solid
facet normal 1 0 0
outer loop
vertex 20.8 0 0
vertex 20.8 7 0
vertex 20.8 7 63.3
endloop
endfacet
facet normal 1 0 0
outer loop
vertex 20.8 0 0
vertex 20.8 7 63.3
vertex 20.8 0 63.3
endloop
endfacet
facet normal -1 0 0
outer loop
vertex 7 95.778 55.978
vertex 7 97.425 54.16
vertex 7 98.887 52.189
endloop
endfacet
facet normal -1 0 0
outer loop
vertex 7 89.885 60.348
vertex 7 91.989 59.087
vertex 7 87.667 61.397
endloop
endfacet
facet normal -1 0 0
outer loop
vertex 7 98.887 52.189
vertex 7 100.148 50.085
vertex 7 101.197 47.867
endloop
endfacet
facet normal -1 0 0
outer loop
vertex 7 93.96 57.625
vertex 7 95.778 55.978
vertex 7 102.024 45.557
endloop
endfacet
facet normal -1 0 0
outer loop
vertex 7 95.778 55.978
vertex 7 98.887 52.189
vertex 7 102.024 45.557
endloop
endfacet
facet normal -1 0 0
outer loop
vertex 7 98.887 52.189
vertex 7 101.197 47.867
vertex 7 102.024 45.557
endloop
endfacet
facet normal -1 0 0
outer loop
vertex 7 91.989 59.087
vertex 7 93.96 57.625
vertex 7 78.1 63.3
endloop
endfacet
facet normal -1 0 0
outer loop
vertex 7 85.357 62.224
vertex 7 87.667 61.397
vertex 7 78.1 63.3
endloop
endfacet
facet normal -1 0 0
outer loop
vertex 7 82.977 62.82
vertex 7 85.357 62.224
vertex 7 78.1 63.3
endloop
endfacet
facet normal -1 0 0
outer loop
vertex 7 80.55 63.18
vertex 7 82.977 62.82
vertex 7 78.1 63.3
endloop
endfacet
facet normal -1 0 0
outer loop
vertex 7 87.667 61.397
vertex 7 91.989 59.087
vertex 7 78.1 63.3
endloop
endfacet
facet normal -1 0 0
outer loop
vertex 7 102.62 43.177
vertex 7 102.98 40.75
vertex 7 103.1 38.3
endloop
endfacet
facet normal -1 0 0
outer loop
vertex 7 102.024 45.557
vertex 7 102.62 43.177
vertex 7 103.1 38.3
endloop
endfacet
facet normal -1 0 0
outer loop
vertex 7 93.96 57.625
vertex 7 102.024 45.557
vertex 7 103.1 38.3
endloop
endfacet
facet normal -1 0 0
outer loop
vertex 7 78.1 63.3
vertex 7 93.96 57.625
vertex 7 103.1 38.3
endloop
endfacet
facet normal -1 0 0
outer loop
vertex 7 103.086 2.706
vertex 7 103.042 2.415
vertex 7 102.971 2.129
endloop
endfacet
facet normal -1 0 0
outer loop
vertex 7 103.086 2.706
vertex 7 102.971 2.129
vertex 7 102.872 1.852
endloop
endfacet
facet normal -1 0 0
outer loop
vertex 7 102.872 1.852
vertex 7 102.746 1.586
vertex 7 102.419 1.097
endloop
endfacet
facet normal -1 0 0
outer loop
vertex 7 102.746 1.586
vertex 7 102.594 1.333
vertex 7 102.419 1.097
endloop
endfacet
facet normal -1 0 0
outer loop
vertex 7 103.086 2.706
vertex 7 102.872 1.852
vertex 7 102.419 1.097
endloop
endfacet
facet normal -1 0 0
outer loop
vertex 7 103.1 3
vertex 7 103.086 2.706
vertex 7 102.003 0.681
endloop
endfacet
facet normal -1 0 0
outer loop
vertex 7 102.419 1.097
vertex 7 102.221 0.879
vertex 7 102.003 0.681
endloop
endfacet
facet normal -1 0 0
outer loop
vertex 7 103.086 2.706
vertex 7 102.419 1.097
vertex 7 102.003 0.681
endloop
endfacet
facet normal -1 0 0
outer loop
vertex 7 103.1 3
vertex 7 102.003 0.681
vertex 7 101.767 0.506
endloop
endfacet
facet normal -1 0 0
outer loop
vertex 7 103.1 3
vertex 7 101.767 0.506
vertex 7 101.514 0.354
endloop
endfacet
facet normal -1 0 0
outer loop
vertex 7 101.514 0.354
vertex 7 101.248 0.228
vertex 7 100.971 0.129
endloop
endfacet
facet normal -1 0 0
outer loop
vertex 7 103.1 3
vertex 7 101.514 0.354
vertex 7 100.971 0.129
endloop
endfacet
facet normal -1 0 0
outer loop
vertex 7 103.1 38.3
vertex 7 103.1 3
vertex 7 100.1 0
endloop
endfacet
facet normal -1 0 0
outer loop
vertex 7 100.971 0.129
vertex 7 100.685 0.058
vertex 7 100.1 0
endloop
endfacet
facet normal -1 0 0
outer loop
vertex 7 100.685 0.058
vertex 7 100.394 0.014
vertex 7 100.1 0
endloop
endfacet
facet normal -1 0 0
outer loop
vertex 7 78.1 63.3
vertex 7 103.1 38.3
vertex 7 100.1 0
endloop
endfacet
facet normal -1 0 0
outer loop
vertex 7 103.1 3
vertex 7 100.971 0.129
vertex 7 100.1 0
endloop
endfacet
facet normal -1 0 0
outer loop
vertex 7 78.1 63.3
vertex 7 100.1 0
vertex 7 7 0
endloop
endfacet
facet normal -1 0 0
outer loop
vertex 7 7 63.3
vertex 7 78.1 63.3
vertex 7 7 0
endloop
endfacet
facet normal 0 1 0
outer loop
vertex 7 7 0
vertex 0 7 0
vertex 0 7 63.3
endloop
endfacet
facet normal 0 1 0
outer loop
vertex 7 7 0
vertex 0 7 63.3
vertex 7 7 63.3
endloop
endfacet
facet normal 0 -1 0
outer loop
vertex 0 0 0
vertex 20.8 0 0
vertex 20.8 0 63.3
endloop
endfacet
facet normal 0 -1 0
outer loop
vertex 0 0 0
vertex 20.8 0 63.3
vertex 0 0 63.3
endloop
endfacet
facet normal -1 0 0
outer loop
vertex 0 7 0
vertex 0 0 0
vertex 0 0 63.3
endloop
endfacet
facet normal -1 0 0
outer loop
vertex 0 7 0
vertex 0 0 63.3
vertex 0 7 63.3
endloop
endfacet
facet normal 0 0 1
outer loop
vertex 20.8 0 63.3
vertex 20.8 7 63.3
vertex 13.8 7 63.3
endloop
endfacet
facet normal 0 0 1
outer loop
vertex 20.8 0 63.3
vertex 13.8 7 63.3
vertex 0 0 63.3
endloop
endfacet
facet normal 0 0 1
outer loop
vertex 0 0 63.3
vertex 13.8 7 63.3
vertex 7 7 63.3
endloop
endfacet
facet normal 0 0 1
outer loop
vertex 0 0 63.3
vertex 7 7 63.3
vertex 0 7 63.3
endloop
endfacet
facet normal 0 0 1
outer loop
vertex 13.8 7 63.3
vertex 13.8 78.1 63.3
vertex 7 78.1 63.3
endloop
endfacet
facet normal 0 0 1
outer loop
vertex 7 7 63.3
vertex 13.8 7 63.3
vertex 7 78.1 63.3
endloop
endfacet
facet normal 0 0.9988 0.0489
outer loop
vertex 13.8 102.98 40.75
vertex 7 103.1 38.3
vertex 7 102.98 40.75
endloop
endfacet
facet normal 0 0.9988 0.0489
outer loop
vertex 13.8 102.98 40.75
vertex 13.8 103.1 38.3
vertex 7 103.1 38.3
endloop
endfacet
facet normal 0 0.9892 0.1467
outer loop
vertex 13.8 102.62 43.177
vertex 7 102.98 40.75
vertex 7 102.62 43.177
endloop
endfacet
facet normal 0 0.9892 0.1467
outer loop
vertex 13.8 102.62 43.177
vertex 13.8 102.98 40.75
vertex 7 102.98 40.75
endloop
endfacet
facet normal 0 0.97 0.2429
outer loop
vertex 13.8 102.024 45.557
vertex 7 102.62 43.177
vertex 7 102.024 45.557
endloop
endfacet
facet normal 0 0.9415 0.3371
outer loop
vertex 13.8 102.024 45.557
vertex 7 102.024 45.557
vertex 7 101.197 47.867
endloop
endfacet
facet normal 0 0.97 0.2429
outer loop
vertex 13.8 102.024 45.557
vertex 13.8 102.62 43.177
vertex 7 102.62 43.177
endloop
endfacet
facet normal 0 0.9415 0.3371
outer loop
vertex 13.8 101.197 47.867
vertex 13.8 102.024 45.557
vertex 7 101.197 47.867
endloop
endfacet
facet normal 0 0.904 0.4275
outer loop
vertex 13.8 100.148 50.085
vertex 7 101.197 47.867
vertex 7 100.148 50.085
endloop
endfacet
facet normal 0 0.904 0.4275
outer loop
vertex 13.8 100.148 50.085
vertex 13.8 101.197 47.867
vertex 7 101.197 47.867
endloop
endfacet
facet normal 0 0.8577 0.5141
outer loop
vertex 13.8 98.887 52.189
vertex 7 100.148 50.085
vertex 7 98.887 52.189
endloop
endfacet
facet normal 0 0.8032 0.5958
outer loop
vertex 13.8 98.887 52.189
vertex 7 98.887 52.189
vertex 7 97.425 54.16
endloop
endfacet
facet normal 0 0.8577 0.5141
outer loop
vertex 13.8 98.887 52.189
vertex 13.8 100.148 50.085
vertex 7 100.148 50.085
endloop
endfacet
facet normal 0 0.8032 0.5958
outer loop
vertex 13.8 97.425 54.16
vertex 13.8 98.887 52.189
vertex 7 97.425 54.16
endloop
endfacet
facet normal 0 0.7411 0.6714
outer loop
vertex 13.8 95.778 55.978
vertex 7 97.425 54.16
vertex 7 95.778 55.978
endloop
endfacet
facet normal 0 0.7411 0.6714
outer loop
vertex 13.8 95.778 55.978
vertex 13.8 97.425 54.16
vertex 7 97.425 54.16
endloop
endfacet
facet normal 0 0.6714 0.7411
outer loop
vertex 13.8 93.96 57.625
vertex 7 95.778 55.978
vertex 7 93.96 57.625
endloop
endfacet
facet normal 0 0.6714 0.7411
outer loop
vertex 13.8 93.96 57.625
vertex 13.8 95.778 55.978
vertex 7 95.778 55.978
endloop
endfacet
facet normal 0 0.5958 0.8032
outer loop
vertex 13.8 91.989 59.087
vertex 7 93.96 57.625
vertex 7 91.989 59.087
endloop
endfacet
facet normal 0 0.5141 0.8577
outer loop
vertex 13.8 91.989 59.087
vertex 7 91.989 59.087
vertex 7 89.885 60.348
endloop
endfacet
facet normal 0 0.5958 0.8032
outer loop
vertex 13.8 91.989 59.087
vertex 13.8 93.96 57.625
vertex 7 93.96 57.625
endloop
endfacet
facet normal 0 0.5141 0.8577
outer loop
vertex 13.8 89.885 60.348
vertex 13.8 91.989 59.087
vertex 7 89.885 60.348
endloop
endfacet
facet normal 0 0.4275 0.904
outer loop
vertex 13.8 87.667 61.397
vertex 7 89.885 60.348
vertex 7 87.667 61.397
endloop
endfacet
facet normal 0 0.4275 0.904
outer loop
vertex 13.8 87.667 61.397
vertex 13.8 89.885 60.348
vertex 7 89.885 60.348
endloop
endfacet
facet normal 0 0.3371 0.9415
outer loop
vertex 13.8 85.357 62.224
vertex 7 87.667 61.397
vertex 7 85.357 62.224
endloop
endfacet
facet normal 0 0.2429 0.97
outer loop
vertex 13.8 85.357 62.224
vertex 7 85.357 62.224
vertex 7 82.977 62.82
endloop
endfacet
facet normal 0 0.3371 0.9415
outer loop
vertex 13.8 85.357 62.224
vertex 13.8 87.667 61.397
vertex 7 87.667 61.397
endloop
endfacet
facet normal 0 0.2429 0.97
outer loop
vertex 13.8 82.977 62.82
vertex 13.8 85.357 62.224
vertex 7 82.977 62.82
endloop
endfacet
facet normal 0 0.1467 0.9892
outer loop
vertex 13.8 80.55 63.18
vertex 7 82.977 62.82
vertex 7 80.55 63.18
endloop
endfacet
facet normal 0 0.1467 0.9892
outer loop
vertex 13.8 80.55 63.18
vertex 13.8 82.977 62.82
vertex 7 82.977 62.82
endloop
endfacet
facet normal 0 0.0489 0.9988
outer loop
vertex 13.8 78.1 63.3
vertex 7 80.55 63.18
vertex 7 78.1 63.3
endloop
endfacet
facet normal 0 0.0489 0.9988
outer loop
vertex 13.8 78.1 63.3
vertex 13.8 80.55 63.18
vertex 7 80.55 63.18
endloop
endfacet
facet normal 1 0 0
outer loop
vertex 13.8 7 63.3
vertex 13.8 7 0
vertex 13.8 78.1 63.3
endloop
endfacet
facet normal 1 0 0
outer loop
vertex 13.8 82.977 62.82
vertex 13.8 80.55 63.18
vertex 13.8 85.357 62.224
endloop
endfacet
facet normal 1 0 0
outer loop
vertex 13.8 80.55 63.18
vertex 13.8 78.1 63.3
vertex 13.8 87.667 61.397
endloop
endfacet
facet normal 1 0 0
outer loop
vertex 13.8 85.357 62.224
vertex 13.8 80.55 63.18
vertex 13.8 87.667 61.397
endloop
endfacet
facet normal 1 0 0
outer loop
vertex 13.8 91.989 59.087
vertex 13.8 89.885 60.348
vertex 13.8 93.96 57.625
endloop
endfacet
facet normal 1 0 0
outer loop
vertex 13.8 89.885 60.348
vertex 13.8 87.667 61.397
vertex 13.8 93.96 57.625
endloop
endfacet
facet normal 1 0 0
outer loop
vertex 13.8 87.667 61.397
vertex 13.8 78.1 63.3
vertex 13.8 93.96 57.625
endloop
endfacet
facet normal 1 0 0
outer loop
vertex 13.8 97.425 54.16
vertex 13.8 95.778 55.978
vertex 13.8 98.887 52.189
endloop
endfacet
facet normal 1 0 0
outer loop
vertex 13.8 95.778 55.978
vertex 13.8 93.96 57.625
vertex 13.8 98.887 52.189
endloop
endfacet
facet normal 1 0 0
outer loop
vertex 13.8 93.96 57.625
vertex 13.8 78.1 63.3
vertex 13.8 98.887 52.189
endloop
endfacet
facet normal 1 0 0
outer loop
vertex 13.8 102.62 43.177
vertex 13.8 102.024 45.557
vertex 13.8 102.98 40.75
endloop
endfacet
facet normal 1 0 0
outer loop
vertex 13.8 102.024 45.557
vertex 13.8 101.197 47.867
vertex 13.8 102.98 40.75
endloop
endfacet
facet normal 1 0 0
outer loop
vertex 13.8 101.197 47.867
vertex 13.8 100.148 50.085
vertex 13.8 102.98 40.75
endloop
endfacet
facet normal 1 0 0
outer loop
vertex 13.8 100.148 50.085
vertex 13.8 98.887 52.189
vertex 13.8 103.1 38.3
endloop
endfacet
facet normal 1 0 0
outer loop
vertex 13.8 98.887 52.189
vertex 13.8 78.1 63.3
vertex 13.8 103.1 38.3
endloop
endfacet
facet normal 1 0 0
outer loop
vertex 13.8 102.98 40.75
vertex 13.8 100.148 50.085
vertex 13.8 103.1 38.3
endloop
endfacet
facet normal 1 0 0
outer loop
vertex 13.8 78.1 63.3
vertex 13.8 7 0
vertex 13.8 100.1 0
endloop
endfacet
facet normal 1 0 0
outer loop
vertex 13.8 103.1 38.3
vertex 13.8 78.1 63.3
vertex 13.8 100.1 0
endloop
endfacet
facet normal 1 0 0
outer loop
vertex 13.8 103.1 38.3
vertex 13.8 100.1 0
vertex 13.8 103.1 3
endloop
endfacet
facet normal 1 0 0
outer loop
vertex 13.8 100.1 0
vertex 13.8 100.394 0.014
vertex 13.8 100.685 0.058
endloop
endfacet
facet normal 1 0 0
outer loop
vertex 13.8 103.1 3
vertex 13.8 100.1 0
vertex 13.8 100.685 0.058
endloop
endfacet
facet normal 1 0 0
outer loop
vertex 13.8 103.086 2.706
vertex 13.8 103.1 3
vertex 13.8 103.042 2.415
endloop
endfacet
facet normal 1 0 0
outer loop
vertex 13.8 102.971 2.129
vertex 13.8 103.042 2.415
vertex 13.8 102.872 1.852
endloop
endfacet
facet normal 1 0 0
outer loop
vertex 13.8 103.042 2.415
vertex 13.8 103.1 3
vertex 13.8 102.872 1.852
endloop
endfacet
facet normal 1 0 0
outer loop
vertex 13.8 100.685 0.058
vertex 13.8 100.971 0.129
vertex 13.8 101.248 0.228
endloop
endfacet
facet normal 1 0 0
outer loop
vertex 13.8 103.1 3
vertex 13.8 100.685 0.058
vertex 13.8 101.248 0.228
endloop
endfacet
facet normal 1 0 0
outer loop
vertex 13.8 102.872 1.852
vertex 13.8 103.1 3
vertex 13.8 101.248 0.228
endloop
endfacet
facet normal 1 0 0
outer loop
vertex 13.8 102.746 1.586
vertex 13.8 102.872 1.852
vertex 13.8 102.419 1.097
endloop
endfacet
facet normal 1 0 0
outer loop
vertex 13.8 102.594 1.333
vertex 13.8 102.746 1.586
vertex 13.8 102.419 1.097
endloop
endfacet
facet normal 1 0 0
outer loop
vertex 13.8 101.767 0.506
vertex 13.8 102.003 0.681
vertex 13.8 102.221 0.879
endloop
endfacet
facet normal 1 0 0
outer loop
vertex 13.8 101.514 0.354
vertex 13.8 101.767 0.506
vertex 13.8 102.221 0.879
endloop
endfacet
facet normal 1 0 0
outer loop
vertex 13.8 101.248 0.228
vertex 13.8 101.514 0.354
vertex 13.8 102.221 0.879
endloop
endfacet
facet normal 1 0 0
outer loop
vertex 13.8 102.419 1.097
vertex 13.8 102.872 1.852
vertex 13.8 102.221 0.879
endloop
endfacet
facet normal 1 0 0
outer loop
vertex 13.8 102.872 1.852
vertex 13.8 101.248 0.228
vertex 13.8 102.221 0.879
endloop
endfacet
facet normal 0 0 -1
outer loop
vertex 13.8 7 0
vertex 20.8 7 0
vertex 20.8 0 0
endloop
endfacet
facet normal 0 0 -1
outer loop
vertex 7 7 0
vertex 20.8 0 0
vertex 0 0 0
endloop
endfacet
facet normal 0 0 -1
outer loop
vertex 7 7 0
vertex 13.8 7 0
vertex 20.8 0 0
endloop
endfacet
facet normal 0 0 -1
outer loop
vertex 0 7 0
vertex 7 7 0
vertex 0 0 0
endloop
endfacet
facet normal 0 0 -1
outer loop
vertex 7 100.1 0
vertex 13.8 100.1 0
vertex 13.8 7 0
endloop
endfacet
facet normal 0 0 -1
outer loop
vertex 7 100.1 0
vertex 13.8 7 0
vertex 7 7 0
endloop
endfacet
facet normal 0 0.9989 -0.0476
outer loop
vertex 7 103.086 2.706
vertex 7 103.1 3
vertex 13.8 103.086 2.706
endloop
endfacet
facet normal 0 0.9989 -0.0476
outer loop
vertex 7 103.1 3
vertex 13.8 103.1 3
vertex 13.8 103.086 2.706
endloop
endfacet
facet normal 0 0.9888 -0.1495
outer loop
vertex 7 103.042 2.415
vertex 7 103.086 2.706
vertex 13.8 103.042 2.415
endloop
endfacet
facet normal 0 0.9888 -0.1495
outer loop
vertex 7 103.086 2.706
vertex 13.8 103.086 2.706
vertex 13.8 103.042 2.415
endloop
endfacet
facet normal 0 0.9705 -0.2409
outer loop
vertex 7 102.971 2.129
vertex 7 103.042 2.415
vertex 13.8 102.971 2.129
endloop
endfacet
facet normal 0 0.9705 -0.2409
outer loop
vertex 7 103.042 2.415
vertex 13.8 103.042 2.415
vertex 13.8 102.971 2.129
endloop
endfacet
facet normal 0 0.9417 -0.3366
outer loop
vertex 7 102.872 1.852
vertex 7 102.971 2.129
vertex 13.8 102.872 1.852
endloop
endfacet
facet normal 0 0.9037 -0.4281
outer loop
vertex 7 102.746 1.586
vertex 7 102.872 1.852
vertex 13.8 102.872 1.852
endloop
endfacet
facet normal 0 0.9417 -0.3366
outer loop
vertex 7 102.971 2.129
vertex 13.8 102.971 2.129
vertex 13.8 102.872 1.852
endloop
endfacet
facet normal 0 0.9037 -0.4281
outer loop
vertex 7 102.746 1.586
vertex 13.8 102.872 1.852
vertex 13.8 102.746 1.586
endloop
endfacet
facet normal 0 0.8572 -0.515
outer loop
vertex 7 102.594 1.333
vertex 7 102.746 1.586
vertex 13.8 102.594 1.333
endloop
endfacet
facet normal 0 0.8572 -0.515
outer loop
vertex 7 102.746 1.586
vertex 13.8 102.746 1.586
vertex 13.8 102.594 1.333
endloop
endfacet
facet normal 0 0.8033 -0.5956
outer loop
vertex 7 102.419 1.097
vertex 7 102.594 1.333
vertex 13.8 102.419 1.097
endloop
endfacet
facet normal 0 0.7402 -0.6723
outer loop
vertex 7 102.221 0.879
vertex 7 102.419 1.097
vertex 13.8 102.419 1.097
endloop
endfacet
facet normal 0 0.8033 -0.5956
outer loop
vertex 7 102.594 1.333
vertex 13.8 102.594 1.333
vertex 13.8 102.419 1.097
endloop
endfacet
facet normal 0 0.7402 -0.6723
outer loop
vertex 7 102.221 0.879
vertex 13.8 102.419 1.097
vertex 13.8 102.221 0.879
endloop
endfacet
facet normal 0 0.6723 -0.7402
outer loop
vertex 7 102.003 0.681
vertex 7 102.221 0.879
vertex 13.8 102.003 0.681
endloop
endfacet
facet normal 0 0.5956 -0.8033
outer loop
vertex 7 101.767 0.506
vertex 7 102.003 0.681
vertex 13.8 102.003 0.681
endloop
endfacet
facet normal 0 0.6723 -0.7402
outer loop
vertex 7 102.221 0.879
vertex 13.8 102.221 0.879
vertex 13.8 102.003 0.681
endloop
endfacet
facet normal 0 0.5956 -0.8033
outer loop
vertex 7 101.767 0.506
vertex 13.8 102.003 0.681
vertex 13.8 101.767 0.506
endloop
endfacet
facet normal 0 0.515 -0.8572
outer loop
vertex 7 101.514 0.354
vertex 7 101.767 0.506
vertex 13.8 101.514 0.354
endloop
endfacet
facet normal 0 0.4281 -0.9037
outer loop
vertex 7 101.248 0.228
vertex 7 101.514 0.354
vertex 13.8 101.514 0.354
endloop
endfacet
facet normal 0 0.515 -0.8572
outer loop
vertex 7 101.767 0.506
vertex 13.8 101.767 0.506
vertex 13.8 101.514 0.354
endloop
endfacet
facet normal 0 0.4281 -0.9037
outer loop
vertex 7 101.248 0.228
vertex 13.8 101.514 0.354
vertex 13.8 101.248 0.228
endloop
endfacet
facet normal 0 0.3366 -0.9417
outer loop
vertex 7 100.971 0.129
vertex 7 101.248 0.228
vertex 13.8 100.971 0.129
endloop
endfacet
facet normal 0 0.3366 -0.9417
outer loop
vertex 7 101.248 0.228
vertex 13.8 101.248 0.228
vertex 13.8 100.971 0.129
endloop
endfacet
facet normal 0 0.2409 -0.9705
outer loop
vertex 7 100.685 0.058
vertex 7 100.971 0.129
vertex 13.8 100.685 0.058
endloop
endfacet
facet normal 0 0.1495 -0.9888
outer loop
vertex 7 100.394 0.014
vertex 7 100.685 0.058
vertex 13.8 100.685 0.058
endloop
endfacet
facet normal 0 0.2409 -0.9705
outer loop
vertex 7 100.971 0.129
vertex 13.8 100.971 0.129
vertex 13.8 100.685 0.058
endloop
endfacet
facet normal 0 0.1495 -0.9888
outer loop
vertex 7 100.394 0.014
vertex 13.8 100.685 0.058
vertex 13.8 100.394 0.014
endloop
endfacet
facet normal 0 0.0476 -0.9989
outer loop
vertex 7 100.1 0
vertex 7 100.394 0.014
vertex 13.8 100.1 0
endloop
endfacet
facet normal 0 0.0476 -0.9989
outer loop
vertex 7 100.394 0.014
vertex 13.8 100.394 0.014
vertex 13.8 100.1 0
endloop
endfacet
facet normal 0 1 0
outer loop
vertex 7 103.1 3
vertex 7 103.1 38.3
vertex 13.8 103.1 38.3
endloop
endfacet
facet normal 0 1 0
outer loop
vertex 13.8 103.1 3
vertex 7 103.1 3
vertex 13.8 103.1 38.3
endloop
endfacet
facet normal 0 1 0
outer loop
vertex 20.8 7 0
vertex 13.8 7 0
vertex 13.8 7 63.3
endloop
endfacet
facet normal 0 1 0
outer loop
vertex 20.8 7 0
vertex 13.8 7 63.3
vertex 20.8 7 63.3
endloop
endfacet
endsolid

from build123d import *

# Parameters (mm, degrees)
BOSS_EXTRUDE1_DEPTH = 63.3
FILLET4_R           = 3
FILLET5_R           = 25


with BuildPart() as part:
    # Sketch1 → Boss-Extrude1 (new body)
    with BuildSketch(Plane.XY):
        Polygon((0, 7), (7, 7), (7, 18.10712891), (7, 103.1), (13.8, 103.1), (13.8, 18.10712891), (13.8, 7), (20.8, 7), (20.8, 0), (0, 0), align=None)
    extrude(amount=BOSS_EXTRUDE1_DEPTH)

    # Fillet4
    fillet4_edges = [part.edges().sort_by_distance(p)[0] for p in [
        (10.4, 103.1, 0),
    ]]
    fillet(fillet4_edges, radius=FILLET4_R)

    # Fillet5
    fillet5_edges = [part.edges().sort_by_distance(p)[0] for p in [
        (10.4, 103.1, 63.3),
    ]]
    fillet(fillet5_edges, radius=FILLET5_R)


solid = part.part
